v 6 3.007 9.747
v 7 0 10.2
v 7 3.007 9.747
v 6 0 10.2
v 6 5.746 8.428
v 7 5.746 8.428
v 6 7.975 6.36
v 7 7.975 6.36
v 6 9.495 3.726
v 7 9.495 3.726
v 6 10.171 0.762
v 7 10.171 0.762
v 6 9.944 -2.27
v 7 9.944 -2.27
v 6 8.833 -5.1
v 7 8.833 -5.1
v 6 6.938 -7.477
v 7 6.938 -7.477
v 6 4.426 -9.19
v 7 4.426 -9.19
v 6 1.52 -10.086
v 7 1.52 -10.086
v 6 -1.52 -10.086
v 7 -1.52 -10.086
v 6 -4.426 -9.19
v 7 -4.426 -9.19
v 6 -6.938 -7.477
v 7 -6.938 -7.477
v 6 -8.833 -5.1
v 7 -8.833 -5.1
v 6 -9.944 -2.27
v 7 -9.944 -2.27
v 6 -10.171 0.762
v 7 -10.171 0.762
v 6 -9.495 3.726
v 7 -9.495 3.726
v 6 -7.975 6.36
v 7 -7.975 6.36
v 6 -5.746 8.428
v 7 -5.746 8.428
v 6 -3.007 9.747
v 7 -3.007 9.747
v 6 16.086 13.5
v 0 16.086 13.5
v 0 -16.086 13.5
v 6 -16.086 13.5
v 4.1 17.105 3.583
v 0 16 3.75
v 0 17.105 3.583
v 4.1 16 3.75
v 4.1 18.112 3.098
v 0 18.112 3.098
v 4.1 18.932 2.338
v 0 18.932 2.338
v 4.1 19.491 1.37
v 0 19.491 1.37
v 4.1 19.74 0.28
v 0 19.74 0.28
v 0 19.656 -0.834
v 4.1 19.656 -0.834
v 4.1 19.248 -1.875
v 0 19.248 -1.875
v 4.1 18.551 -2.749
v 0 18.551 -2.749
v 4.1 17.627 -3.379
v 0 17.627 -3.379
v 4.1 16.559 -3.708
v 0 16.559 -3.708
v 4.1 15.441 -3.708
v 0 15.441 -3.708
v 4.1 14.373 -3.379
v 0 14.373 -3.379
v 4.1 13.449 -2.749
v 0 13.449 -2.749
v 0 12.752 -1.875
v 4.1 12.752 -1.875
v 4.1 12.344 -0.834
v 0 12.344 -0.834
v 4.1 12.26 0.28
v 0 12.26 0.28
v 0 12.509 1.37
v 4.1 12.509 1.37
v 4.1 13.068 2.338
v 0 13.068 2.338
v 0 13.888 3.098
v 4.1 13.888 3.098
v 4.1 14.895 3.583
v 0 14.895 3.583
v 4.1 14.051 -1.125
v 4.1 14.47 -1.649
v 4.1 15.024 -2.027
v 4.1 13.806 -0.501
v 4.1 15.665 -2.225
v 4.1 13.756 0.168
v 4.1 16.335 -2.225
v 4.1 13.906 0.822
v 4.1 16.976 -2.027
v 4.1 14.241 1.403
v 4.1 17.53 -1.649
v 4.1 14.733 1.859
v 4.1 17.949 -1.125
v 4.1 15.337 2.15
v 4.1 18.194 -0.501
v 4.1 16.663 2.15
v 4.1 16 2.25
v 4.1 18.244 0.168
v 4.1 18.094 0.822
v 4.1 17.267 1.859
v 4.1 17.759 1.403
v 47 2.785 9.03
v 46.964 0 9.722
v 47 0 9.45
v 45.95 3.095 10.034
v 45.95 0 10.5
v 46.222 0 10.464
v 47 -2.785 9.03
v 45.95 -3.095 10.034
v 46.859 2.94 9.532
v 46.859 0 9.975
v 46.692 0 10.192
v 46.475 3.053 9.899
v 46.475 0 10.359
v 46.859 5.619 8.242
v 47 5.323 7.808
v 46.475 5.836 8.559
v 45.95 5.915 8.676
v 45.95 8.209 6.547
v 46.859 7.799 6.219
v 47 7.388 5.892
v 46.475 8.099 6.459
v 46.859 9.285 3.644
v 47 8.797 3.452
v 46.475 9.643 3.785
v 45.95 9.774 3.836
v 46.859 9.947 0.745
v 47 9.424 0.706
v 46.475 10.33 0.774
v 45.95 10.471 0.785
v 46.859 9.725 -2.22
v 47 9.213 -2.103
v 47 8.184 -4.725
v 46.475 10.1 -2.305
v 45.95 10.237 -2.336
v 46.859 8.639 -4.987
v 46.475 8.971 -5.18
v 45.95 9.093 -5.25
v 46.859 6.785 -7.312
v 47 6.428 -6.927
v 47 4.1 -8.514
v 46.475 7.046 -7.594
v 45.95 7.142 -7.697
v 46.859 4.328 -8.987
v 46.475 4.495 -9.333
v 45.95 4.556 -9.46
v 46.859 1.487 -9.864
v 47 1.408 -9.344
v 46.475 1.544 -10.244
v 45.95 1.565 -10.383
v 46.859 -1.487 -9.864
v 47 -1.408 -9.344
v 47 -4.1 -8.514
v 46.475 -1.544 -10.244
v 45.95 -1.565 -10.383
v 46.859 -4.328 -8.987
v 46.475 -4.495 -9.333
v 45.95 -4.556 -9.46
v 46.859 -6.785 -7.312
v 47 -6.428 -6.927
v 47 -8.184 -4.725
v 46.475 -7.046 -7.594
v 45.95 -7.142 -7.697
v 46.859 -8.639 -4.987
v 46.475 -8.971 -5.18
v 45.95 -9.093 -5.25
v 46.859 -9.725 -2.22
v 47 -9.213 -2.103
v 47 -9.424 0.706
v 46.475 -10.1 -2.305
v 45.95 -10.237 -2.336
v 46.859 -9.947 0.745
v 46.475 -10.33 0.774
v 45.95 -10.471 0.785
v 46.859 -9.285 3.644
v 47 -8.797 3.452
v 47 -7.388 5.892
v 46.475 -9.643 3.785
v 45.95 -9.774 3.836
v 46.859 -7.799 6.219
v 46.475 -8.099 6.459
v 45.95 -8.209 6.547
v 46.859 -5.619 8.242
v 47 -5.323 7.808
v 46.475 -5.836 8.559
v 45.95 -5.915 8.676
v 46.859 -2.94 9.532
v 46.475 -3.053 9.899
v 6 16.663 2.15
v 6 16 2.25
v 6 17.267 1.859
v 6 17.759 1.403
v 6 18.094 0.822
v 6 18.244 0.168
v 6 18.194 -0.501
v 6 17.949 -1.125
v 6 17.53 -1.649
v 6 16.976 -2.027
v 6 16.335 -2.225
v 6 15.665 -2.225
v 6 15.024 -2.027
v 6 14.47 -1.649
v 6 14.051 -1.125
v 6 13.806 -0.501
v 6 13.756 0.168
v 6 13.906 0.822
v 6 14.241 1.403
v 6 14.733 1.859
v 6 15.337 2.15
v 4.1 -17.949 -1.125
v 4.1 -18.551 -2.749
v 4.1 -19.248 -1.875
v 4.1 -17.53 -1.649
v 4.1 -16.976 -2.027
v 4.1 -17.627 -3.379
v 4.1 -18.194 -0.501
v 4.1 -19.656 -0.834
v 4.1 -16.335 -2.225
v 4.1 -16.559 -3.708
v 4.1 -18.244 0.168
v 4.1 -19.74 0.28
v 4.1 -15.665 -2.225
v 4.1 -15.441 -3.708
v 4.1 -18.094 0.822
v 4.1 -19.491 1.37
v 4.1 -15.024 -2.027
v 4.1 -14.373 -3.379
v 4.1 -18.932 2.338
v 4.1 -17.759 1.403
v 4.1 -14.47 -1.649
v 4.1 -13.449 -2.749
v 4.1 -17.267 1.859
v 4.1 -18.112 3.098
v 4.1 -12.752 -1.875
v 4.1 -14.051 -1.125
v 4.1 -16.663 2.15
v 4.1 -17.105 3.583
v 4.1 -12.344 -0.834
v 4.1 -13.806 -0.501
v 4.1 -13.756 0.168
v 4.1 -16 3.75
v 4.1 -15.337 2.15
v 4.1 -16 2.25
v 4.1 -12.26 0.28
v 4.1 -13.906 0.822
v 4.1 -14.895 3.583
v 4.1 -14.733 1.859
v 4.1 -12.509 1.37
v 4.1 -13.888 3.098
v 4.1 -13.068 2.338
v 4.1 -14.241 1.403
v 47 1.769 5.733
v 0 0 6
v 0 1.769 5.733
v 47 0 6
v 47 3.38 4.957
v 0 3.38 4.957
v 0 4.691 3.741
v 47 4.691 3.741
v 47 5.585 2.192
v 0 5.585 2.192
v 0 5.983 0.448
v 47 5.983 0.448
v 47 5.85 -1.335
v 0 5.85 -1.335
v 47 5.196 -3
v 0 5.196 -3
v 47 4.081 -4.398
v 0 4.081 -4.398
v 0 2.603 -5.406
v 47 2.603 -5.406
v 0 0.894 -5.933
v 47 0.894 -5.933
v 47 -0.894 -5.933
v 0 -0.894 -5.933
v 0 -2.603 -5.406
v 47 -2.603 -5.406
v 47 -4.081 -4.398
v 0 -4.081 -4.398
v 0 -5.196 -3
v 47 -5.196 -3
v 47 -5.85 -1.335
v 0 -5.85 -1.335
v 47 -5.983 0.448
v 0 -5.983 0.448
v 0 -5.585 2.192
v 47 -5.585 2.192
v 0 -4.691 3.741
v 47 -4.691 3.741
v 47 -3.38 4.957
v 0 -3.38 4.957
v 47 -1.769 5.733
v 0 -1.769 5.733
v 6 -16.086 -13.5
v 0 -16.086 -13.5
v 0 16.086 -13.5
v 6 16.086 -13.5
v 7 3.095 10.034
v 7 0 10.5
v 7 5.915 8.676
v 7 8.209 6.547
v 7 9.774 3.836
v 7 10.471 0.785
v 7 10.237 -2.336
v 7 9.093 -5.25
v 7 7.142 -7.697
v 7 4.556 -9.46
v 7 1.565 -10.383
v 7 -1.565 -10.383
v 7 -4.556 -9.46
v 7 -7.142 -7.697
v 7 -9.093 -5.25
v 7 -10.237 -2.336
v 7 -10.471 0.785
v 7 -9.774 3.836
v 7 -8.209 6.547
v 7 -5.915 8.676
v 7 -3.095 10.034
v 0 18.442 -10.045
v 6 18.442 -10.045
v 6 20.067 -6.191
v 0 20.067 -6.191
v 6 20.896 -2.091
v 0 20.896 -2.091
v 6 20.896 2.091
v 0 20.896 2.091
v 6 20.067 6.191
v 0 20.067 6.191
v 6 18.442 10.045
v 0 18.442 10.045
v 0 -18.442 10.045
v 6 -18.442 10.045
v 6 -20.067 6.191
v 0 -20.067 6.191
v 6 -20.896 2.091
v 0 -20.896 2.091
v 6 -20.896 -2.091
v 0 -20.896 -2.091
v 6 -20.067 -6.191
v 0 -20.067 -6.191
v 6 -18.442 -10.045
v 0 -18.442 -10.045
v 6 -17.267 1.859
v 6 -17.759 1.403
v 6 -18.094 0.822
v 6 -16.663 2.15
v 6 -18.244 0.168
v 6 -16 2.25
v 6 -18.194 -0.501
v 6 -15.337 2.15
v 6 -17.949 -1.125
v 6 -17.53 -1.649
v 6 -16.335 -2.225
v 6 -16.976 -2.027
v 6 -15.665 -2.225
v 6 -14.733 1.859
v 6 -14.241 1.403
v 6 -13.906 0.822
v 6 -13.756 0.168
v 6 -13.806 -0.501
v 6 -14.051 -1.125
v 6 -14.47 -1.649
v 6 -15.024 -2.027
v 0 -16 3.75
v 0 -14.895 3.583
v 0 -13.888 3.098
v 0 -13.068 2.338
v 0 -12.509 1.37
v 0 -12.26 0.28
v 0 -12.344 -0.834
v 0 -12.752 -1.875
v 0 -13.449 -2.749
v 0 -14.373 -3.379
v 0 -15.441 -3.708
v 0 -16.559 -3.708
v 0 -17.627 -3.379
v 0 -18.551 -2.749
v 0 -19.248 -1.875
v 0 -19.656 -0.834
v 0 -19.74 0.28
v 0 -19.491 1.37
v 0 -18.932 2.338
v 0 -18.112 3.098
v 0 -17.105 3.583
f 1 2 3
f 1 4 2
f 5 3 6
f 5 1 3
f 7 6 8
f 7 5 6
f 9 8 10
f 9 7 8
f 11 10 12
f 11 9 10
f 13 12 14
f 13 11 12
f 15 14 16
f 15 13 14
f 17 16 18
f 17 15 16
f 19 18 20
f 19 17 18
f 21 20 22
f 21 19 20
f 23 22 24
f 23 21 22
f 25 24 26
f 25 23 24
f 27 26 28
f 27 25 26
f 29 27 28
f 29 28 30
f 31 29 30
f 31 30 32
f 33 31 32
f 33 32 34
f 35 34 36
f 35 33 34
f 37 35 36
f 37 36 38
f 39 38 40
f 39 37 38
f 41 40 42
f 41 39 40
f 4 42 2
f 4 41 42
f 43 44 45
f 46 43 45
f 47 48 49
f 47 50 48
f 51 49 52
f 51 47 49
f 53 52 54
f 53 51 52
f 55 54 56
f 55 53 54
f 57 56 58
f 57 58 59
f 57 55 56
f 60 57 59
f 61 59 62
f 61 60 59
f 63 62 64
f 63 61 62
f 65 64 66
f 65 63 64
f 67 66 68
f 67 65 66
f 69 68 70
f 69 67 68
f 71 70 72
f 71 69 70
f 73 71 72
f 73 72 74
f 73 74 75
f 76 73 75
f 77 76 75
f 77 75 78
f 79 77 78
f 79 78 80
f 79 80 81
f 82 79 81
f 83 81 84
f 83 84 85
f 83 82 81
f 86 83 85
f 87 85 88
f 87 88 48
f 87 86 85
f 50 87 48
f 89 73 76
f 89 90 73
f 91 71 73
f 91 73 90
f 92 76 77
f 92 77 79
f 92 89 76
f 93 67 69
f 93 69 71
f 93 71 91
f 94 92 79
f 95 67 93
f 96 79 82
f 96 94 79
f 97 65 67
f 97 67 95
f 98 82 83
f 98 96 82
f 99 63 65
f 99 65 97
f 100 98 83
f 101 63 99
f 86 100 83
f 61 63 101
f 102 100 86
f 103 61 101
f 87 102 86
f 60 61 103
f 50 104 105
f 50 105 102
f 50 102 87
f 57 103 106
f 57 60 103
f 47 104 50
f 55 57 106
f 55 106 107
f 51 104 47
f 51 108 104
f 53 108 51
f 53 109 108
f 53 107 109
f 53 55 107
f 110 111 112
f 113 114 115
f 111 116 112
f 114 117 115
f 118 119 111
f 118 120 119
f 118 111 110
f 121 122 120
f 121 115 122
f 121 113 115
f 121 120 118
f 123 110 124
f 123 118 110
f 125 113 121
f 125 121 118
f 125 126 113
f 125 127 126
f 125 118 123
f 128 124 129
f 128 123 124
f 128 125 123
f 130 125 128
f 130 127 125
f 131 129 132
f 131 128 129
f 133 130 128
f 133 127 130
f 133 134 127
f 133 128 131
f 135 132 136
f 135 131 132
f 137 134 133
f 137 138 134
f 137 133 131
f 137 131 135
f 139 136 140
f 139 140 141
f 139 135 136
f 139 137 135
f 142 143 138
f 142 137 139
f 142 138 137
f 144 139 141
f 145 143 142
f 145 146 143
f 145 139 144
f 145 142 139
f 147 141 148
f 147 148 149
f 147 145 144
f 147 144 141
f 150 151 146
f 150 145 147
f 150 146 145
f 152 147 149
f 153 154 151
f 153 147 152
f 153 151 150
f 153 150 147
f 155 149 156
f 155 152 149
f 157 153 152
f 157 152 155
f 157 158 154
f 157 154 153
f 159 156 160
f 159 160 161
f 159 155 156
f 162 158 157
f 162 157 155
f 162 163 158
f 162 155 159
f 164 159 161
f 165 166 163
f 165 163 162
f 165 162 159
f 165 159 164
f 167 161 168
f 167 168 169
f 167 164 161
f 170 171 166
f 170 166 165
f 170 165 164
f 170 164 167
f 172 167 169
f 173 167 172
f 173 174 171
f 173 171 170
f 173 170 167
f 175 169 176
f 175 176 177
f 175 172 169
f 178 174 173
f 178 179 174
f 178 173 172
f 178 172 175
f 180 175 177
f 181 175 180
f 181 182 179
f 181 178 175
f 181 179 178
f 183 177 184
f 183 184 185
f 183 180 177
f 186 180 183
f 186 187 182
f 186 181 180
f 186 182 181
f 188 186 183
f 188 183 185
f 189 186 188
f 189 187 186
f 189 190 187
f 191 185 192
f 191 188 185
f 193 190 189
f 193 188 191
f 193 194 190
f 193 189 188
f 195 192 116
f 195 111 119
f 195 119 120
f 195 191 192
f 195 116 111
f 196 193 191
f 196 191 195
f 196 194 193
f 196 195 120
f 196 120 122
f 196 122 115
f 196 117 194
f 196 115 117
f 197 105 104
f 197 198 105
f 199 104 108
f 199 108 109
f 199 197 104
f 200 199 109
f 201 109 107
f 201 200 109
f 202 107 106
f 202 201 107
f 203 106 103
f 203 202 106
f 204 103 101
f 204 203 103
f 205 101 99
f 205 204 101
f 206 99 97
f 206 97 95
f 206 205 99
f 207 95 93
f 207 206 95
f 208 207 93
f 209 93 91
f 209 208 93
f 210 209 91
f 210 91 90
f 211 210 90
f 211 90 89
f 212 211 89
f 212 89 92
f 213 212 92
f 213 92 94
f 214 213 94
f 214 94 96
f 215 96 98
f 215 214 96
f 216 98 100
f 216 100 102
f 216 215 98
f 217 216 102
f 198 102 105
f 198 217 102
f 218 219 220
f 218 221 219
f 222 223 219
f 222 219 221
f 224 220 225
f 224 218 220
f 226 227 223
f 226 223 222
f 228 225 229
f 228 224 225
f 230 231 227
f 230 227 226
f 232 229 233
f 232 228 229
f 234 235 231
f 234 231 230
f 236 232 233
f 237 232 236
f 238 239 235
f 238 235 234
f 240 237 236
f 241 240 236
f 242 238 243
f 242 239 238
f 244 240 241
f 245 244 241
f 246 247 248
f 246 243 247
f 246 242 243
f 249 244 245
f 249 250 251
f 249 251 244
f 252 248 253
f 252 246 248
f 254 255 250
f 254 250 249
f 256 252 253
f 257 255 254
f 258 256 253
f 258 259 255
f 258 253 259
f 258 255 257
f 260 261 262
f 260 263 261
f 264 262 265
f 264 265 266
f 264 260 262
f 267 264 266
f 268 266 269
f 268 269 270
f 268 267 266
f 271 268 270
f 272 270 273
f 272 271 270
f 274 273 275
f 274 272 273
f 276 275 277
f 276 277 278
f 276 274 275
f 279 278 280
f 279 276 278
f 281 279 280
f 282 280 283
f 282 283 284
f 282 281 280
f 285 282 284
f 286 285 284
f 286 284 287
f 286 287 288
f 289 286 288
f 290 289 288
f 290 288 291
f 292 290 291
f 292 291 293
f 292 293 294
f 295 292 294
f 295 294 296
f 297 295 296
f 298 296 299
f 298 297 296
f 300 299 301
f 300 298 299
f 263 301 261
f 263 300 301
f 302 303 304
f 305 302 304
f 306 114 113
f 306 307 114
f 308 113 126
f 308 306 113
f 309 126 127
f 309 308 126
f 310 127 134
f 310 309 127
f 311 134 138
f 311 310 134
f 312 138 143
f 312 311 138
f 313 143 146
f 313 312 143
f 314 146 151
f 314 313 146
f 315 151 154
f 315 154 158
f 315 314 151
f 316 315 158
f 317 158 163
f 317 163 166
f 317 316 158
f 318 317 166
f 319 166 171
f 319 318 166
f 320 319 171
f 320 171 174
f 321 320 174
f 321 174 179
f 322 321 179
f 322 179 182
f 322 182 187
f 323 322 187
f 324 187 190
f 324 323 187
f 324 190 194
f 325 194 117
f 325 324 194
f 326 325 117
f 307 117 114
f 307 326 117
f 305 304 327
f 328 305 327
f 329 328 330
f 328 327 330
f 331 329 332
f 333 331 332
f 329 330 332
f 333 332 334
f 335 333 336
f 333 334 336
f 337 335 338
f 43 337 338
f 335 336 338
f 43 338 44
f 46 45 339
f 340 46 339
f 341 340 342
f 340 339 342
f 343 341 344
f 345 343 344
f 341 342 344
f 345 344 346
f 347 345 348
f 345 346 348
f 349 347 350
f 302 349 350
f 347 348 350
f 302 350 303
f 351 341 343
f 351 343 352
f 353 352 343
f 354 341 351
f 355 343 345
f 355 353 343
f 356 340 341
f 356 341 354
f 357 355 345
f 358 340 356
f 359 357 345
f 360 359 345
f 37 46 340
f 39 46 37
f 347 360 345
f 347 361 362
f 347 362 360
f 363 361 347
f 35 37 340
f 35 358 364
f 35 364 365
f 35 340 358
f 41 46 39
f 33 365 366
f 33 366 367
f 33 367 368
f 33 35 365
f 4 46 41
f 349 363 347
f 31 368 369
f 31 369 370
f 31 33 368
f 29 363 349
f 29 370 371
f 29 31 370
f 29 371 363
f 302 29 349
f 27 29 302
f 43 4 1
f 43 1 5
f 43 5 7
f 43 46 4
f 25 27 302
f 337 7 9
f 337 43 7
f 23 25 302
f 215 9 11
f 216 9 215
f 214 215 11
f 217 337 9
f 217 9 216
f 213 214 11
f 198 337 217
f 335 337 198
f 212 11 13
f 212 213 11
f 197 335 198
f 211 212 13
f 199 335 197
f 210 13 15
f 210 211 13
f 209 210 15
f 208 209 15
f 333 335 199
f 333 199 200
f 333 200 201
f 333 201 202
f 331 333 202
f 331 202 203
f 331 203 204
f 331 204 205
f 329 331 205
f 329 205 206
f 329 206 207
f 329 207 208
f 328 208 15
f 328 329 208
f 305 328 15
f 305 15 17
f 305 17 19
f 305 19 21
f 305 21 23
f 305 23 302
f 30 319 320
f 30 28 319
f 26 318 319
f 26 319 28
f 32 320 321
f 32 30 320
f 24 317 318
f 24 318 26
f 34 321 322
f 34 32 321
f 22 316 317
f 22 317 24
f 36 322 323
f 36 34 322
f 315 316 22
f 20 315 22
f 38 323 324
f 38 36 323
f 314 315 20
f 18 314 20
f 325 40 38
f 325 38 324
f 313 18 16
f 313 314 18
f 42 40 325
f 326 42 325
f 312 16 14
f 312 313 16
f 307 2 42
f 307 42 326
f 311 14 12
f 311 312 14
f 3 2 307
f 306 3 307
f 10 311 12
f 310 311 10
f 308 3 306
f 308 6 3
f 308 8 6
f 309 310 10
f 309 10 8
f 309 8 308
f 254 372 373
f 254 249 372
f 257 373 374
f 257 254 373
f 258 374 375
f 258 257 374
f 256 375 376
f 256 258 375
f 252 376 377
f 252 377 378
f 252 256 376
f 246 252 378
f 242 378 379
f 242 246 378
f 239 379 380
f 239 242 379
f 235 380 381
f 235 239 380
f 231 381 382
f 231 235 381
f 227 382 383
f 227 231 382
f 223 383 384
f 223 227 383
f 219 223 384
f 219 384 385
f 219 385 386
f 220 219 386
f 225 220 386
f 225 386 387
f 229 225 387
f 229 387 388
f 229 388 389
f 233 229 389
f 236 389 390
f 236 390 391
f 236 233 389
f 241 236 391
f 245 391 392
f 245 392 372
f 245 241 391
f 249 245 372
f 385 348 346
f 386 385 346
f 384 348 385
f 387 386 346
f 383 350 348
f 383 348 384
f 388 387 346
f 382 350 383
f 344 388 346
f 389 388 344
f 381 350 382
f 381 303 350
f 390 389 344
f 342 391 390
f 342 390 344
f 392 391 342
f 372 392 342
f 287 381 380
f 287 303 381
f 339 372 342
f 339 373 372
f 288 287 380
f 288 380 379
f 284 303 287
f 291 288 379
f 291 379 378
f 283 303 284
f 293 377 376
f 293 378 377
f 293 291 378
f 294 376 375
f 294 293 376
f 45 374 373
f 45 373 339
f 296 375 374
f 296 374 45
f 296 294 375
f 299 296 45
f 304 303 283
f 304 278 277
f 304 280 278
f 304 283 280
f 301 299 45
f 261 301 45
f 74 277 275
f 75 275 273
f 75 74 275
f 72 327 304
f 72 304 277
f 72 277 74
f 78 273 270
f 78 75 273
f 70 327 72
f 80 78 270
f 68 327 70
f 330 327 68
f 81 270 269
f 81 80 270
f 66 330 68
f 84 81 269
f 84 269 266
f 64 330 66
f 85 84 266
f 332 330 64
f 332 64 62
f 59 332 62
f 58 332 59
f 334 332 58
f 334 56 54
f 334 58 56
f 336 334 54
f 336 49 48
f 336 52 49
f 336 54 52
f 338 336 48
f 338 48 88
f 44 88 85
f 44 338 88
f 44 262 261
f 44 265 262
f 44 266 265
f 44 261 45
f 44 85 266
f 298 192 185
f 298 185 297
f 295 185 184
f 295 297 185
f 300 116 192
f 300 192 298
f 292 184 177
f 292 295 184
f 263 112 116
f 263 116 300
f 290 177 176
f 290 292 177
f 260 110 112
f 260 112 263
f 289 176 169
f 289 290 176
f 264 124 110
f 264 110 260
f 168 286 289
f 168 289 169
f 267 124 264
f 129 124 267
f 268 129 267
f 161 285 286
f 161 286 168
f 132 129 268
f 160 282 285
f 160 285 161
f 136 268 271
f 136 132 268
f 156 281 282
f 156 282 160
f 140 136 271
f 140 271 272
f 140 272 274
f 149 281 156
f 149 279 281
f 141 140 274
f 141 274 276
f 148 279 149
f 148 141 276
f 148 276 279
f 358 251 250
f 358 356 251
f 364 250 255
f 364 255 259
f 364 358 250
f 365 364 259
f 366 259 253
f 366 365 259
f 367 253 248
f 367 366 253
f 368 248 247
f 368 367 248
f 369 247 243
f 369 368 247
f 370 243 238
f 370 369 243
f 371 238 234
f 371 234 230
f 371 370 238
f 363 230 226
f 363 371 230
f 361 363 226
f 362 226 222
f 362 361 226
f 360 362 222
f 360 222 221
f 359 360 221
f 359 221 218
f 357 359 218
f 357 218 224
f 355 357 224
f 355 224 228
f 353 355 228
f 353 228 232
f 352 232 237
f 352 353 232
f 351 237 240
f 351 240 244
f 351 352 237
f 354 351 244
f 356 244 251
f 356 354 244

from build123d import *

# Parameters (mm, degrees)
SKETCH2_W          = 84
SKETCH2_H          = 84
CUT_EXTRUDE1_DEPTH = 6


with BuildPart() as part:
    # Sketch1 → Revolve1 (revolve)
    with BuildSketch(Plane.XY, mode=Mode.PRIVATE) as revolve1_sk:
        with BuildLine():
            Line((0, 21), (0, 6))
            Line((0, 6), (47, 6))
            Line((47, 6), (47, 9.45))
            ThreePointArc((47, 9.45), (46.69246212, 10.19246212), (45.95, 10.5))
            Line((45.95, 10.5), (7, 10.5))
            Line((7, 10.5), (7, 10.2))
            Line((7, 10.2), (6, 10.2))
            Line((6, 10.2), (6, 21))
            Line((6, 21), (0, 21))
        make_face()
    revolve(revolve1_sk.sketch.rotate(Axis((47, 0, 0), (-1, 0, 0)), 270), axis=Axis((47, 0, 0), (-1, 0, 0)))

    # Sketch2 → Cut-Extrude1 (cut)
    with BuildSketch(Plane(origin=(0, 0, 0), x_dir=(0, 0, -1), z_dir=(1, 0, 0))):
        Rectangle(SKETCH2_W, SKETCH2_H)
        with BuildLine():
            Line((13.5, -16.085707942), (13.5, 16.085707942))
            ThreePointArc((13.5, 16.085707942), (0, 21), (-13.5, 16.085707942))
            Line((-13.5, 16.085707942), (-13.5, -16.085707942))
            ThreePointArc((-13.5, -16.085707942), (0, -21), (13.5, -16.085707942))
        make_face(mode=Mode.SUBTRACT)
    extrude(amount=CUT_EXTRUDE1_DEPTH, mode=Mode.SUBTRACT)

    # Sketch3 → Cut-Revolve1 (revolve, cut)
    with BuildSketch(Plane.XY, mode=Mode.PRIVATE) as cut_revolve1_sk:
        Polygon((0, 16), (0, 19.75), (4.1, 19.75), (4.1, 18.25), (6, 18.25), (6, 16), align=None)
    revolve(cut_revolve1_sk.sketch.rotate(Axis((6, 16, 0), (-1, 0, 0)), 270), axis=Axis((6, 16, 0), (-1, 0, 0)), mode=Mode.SUBTRACT)

    # Sketch4 → Cut-Revolve2 (revolve, cut)
    with BuildSketch(Plane.XY, mode=Mode.PRIVATE) as cut_revolve2_sk:
        Polygon((0, -16), (0, -12.25), (4.1, -12.25), (4.1, -13.75), (6, -13.75), (6, -16), align=None)
    revolve(cut_revolve2_sk.sketch.rotate(Axis((6, -16, 0), (-1, 0, 0)), 270), axis=Axis((6, -16, 0), (-1, 0, 0)), mode=Mode.SUBTRACT)


solid = part.part
